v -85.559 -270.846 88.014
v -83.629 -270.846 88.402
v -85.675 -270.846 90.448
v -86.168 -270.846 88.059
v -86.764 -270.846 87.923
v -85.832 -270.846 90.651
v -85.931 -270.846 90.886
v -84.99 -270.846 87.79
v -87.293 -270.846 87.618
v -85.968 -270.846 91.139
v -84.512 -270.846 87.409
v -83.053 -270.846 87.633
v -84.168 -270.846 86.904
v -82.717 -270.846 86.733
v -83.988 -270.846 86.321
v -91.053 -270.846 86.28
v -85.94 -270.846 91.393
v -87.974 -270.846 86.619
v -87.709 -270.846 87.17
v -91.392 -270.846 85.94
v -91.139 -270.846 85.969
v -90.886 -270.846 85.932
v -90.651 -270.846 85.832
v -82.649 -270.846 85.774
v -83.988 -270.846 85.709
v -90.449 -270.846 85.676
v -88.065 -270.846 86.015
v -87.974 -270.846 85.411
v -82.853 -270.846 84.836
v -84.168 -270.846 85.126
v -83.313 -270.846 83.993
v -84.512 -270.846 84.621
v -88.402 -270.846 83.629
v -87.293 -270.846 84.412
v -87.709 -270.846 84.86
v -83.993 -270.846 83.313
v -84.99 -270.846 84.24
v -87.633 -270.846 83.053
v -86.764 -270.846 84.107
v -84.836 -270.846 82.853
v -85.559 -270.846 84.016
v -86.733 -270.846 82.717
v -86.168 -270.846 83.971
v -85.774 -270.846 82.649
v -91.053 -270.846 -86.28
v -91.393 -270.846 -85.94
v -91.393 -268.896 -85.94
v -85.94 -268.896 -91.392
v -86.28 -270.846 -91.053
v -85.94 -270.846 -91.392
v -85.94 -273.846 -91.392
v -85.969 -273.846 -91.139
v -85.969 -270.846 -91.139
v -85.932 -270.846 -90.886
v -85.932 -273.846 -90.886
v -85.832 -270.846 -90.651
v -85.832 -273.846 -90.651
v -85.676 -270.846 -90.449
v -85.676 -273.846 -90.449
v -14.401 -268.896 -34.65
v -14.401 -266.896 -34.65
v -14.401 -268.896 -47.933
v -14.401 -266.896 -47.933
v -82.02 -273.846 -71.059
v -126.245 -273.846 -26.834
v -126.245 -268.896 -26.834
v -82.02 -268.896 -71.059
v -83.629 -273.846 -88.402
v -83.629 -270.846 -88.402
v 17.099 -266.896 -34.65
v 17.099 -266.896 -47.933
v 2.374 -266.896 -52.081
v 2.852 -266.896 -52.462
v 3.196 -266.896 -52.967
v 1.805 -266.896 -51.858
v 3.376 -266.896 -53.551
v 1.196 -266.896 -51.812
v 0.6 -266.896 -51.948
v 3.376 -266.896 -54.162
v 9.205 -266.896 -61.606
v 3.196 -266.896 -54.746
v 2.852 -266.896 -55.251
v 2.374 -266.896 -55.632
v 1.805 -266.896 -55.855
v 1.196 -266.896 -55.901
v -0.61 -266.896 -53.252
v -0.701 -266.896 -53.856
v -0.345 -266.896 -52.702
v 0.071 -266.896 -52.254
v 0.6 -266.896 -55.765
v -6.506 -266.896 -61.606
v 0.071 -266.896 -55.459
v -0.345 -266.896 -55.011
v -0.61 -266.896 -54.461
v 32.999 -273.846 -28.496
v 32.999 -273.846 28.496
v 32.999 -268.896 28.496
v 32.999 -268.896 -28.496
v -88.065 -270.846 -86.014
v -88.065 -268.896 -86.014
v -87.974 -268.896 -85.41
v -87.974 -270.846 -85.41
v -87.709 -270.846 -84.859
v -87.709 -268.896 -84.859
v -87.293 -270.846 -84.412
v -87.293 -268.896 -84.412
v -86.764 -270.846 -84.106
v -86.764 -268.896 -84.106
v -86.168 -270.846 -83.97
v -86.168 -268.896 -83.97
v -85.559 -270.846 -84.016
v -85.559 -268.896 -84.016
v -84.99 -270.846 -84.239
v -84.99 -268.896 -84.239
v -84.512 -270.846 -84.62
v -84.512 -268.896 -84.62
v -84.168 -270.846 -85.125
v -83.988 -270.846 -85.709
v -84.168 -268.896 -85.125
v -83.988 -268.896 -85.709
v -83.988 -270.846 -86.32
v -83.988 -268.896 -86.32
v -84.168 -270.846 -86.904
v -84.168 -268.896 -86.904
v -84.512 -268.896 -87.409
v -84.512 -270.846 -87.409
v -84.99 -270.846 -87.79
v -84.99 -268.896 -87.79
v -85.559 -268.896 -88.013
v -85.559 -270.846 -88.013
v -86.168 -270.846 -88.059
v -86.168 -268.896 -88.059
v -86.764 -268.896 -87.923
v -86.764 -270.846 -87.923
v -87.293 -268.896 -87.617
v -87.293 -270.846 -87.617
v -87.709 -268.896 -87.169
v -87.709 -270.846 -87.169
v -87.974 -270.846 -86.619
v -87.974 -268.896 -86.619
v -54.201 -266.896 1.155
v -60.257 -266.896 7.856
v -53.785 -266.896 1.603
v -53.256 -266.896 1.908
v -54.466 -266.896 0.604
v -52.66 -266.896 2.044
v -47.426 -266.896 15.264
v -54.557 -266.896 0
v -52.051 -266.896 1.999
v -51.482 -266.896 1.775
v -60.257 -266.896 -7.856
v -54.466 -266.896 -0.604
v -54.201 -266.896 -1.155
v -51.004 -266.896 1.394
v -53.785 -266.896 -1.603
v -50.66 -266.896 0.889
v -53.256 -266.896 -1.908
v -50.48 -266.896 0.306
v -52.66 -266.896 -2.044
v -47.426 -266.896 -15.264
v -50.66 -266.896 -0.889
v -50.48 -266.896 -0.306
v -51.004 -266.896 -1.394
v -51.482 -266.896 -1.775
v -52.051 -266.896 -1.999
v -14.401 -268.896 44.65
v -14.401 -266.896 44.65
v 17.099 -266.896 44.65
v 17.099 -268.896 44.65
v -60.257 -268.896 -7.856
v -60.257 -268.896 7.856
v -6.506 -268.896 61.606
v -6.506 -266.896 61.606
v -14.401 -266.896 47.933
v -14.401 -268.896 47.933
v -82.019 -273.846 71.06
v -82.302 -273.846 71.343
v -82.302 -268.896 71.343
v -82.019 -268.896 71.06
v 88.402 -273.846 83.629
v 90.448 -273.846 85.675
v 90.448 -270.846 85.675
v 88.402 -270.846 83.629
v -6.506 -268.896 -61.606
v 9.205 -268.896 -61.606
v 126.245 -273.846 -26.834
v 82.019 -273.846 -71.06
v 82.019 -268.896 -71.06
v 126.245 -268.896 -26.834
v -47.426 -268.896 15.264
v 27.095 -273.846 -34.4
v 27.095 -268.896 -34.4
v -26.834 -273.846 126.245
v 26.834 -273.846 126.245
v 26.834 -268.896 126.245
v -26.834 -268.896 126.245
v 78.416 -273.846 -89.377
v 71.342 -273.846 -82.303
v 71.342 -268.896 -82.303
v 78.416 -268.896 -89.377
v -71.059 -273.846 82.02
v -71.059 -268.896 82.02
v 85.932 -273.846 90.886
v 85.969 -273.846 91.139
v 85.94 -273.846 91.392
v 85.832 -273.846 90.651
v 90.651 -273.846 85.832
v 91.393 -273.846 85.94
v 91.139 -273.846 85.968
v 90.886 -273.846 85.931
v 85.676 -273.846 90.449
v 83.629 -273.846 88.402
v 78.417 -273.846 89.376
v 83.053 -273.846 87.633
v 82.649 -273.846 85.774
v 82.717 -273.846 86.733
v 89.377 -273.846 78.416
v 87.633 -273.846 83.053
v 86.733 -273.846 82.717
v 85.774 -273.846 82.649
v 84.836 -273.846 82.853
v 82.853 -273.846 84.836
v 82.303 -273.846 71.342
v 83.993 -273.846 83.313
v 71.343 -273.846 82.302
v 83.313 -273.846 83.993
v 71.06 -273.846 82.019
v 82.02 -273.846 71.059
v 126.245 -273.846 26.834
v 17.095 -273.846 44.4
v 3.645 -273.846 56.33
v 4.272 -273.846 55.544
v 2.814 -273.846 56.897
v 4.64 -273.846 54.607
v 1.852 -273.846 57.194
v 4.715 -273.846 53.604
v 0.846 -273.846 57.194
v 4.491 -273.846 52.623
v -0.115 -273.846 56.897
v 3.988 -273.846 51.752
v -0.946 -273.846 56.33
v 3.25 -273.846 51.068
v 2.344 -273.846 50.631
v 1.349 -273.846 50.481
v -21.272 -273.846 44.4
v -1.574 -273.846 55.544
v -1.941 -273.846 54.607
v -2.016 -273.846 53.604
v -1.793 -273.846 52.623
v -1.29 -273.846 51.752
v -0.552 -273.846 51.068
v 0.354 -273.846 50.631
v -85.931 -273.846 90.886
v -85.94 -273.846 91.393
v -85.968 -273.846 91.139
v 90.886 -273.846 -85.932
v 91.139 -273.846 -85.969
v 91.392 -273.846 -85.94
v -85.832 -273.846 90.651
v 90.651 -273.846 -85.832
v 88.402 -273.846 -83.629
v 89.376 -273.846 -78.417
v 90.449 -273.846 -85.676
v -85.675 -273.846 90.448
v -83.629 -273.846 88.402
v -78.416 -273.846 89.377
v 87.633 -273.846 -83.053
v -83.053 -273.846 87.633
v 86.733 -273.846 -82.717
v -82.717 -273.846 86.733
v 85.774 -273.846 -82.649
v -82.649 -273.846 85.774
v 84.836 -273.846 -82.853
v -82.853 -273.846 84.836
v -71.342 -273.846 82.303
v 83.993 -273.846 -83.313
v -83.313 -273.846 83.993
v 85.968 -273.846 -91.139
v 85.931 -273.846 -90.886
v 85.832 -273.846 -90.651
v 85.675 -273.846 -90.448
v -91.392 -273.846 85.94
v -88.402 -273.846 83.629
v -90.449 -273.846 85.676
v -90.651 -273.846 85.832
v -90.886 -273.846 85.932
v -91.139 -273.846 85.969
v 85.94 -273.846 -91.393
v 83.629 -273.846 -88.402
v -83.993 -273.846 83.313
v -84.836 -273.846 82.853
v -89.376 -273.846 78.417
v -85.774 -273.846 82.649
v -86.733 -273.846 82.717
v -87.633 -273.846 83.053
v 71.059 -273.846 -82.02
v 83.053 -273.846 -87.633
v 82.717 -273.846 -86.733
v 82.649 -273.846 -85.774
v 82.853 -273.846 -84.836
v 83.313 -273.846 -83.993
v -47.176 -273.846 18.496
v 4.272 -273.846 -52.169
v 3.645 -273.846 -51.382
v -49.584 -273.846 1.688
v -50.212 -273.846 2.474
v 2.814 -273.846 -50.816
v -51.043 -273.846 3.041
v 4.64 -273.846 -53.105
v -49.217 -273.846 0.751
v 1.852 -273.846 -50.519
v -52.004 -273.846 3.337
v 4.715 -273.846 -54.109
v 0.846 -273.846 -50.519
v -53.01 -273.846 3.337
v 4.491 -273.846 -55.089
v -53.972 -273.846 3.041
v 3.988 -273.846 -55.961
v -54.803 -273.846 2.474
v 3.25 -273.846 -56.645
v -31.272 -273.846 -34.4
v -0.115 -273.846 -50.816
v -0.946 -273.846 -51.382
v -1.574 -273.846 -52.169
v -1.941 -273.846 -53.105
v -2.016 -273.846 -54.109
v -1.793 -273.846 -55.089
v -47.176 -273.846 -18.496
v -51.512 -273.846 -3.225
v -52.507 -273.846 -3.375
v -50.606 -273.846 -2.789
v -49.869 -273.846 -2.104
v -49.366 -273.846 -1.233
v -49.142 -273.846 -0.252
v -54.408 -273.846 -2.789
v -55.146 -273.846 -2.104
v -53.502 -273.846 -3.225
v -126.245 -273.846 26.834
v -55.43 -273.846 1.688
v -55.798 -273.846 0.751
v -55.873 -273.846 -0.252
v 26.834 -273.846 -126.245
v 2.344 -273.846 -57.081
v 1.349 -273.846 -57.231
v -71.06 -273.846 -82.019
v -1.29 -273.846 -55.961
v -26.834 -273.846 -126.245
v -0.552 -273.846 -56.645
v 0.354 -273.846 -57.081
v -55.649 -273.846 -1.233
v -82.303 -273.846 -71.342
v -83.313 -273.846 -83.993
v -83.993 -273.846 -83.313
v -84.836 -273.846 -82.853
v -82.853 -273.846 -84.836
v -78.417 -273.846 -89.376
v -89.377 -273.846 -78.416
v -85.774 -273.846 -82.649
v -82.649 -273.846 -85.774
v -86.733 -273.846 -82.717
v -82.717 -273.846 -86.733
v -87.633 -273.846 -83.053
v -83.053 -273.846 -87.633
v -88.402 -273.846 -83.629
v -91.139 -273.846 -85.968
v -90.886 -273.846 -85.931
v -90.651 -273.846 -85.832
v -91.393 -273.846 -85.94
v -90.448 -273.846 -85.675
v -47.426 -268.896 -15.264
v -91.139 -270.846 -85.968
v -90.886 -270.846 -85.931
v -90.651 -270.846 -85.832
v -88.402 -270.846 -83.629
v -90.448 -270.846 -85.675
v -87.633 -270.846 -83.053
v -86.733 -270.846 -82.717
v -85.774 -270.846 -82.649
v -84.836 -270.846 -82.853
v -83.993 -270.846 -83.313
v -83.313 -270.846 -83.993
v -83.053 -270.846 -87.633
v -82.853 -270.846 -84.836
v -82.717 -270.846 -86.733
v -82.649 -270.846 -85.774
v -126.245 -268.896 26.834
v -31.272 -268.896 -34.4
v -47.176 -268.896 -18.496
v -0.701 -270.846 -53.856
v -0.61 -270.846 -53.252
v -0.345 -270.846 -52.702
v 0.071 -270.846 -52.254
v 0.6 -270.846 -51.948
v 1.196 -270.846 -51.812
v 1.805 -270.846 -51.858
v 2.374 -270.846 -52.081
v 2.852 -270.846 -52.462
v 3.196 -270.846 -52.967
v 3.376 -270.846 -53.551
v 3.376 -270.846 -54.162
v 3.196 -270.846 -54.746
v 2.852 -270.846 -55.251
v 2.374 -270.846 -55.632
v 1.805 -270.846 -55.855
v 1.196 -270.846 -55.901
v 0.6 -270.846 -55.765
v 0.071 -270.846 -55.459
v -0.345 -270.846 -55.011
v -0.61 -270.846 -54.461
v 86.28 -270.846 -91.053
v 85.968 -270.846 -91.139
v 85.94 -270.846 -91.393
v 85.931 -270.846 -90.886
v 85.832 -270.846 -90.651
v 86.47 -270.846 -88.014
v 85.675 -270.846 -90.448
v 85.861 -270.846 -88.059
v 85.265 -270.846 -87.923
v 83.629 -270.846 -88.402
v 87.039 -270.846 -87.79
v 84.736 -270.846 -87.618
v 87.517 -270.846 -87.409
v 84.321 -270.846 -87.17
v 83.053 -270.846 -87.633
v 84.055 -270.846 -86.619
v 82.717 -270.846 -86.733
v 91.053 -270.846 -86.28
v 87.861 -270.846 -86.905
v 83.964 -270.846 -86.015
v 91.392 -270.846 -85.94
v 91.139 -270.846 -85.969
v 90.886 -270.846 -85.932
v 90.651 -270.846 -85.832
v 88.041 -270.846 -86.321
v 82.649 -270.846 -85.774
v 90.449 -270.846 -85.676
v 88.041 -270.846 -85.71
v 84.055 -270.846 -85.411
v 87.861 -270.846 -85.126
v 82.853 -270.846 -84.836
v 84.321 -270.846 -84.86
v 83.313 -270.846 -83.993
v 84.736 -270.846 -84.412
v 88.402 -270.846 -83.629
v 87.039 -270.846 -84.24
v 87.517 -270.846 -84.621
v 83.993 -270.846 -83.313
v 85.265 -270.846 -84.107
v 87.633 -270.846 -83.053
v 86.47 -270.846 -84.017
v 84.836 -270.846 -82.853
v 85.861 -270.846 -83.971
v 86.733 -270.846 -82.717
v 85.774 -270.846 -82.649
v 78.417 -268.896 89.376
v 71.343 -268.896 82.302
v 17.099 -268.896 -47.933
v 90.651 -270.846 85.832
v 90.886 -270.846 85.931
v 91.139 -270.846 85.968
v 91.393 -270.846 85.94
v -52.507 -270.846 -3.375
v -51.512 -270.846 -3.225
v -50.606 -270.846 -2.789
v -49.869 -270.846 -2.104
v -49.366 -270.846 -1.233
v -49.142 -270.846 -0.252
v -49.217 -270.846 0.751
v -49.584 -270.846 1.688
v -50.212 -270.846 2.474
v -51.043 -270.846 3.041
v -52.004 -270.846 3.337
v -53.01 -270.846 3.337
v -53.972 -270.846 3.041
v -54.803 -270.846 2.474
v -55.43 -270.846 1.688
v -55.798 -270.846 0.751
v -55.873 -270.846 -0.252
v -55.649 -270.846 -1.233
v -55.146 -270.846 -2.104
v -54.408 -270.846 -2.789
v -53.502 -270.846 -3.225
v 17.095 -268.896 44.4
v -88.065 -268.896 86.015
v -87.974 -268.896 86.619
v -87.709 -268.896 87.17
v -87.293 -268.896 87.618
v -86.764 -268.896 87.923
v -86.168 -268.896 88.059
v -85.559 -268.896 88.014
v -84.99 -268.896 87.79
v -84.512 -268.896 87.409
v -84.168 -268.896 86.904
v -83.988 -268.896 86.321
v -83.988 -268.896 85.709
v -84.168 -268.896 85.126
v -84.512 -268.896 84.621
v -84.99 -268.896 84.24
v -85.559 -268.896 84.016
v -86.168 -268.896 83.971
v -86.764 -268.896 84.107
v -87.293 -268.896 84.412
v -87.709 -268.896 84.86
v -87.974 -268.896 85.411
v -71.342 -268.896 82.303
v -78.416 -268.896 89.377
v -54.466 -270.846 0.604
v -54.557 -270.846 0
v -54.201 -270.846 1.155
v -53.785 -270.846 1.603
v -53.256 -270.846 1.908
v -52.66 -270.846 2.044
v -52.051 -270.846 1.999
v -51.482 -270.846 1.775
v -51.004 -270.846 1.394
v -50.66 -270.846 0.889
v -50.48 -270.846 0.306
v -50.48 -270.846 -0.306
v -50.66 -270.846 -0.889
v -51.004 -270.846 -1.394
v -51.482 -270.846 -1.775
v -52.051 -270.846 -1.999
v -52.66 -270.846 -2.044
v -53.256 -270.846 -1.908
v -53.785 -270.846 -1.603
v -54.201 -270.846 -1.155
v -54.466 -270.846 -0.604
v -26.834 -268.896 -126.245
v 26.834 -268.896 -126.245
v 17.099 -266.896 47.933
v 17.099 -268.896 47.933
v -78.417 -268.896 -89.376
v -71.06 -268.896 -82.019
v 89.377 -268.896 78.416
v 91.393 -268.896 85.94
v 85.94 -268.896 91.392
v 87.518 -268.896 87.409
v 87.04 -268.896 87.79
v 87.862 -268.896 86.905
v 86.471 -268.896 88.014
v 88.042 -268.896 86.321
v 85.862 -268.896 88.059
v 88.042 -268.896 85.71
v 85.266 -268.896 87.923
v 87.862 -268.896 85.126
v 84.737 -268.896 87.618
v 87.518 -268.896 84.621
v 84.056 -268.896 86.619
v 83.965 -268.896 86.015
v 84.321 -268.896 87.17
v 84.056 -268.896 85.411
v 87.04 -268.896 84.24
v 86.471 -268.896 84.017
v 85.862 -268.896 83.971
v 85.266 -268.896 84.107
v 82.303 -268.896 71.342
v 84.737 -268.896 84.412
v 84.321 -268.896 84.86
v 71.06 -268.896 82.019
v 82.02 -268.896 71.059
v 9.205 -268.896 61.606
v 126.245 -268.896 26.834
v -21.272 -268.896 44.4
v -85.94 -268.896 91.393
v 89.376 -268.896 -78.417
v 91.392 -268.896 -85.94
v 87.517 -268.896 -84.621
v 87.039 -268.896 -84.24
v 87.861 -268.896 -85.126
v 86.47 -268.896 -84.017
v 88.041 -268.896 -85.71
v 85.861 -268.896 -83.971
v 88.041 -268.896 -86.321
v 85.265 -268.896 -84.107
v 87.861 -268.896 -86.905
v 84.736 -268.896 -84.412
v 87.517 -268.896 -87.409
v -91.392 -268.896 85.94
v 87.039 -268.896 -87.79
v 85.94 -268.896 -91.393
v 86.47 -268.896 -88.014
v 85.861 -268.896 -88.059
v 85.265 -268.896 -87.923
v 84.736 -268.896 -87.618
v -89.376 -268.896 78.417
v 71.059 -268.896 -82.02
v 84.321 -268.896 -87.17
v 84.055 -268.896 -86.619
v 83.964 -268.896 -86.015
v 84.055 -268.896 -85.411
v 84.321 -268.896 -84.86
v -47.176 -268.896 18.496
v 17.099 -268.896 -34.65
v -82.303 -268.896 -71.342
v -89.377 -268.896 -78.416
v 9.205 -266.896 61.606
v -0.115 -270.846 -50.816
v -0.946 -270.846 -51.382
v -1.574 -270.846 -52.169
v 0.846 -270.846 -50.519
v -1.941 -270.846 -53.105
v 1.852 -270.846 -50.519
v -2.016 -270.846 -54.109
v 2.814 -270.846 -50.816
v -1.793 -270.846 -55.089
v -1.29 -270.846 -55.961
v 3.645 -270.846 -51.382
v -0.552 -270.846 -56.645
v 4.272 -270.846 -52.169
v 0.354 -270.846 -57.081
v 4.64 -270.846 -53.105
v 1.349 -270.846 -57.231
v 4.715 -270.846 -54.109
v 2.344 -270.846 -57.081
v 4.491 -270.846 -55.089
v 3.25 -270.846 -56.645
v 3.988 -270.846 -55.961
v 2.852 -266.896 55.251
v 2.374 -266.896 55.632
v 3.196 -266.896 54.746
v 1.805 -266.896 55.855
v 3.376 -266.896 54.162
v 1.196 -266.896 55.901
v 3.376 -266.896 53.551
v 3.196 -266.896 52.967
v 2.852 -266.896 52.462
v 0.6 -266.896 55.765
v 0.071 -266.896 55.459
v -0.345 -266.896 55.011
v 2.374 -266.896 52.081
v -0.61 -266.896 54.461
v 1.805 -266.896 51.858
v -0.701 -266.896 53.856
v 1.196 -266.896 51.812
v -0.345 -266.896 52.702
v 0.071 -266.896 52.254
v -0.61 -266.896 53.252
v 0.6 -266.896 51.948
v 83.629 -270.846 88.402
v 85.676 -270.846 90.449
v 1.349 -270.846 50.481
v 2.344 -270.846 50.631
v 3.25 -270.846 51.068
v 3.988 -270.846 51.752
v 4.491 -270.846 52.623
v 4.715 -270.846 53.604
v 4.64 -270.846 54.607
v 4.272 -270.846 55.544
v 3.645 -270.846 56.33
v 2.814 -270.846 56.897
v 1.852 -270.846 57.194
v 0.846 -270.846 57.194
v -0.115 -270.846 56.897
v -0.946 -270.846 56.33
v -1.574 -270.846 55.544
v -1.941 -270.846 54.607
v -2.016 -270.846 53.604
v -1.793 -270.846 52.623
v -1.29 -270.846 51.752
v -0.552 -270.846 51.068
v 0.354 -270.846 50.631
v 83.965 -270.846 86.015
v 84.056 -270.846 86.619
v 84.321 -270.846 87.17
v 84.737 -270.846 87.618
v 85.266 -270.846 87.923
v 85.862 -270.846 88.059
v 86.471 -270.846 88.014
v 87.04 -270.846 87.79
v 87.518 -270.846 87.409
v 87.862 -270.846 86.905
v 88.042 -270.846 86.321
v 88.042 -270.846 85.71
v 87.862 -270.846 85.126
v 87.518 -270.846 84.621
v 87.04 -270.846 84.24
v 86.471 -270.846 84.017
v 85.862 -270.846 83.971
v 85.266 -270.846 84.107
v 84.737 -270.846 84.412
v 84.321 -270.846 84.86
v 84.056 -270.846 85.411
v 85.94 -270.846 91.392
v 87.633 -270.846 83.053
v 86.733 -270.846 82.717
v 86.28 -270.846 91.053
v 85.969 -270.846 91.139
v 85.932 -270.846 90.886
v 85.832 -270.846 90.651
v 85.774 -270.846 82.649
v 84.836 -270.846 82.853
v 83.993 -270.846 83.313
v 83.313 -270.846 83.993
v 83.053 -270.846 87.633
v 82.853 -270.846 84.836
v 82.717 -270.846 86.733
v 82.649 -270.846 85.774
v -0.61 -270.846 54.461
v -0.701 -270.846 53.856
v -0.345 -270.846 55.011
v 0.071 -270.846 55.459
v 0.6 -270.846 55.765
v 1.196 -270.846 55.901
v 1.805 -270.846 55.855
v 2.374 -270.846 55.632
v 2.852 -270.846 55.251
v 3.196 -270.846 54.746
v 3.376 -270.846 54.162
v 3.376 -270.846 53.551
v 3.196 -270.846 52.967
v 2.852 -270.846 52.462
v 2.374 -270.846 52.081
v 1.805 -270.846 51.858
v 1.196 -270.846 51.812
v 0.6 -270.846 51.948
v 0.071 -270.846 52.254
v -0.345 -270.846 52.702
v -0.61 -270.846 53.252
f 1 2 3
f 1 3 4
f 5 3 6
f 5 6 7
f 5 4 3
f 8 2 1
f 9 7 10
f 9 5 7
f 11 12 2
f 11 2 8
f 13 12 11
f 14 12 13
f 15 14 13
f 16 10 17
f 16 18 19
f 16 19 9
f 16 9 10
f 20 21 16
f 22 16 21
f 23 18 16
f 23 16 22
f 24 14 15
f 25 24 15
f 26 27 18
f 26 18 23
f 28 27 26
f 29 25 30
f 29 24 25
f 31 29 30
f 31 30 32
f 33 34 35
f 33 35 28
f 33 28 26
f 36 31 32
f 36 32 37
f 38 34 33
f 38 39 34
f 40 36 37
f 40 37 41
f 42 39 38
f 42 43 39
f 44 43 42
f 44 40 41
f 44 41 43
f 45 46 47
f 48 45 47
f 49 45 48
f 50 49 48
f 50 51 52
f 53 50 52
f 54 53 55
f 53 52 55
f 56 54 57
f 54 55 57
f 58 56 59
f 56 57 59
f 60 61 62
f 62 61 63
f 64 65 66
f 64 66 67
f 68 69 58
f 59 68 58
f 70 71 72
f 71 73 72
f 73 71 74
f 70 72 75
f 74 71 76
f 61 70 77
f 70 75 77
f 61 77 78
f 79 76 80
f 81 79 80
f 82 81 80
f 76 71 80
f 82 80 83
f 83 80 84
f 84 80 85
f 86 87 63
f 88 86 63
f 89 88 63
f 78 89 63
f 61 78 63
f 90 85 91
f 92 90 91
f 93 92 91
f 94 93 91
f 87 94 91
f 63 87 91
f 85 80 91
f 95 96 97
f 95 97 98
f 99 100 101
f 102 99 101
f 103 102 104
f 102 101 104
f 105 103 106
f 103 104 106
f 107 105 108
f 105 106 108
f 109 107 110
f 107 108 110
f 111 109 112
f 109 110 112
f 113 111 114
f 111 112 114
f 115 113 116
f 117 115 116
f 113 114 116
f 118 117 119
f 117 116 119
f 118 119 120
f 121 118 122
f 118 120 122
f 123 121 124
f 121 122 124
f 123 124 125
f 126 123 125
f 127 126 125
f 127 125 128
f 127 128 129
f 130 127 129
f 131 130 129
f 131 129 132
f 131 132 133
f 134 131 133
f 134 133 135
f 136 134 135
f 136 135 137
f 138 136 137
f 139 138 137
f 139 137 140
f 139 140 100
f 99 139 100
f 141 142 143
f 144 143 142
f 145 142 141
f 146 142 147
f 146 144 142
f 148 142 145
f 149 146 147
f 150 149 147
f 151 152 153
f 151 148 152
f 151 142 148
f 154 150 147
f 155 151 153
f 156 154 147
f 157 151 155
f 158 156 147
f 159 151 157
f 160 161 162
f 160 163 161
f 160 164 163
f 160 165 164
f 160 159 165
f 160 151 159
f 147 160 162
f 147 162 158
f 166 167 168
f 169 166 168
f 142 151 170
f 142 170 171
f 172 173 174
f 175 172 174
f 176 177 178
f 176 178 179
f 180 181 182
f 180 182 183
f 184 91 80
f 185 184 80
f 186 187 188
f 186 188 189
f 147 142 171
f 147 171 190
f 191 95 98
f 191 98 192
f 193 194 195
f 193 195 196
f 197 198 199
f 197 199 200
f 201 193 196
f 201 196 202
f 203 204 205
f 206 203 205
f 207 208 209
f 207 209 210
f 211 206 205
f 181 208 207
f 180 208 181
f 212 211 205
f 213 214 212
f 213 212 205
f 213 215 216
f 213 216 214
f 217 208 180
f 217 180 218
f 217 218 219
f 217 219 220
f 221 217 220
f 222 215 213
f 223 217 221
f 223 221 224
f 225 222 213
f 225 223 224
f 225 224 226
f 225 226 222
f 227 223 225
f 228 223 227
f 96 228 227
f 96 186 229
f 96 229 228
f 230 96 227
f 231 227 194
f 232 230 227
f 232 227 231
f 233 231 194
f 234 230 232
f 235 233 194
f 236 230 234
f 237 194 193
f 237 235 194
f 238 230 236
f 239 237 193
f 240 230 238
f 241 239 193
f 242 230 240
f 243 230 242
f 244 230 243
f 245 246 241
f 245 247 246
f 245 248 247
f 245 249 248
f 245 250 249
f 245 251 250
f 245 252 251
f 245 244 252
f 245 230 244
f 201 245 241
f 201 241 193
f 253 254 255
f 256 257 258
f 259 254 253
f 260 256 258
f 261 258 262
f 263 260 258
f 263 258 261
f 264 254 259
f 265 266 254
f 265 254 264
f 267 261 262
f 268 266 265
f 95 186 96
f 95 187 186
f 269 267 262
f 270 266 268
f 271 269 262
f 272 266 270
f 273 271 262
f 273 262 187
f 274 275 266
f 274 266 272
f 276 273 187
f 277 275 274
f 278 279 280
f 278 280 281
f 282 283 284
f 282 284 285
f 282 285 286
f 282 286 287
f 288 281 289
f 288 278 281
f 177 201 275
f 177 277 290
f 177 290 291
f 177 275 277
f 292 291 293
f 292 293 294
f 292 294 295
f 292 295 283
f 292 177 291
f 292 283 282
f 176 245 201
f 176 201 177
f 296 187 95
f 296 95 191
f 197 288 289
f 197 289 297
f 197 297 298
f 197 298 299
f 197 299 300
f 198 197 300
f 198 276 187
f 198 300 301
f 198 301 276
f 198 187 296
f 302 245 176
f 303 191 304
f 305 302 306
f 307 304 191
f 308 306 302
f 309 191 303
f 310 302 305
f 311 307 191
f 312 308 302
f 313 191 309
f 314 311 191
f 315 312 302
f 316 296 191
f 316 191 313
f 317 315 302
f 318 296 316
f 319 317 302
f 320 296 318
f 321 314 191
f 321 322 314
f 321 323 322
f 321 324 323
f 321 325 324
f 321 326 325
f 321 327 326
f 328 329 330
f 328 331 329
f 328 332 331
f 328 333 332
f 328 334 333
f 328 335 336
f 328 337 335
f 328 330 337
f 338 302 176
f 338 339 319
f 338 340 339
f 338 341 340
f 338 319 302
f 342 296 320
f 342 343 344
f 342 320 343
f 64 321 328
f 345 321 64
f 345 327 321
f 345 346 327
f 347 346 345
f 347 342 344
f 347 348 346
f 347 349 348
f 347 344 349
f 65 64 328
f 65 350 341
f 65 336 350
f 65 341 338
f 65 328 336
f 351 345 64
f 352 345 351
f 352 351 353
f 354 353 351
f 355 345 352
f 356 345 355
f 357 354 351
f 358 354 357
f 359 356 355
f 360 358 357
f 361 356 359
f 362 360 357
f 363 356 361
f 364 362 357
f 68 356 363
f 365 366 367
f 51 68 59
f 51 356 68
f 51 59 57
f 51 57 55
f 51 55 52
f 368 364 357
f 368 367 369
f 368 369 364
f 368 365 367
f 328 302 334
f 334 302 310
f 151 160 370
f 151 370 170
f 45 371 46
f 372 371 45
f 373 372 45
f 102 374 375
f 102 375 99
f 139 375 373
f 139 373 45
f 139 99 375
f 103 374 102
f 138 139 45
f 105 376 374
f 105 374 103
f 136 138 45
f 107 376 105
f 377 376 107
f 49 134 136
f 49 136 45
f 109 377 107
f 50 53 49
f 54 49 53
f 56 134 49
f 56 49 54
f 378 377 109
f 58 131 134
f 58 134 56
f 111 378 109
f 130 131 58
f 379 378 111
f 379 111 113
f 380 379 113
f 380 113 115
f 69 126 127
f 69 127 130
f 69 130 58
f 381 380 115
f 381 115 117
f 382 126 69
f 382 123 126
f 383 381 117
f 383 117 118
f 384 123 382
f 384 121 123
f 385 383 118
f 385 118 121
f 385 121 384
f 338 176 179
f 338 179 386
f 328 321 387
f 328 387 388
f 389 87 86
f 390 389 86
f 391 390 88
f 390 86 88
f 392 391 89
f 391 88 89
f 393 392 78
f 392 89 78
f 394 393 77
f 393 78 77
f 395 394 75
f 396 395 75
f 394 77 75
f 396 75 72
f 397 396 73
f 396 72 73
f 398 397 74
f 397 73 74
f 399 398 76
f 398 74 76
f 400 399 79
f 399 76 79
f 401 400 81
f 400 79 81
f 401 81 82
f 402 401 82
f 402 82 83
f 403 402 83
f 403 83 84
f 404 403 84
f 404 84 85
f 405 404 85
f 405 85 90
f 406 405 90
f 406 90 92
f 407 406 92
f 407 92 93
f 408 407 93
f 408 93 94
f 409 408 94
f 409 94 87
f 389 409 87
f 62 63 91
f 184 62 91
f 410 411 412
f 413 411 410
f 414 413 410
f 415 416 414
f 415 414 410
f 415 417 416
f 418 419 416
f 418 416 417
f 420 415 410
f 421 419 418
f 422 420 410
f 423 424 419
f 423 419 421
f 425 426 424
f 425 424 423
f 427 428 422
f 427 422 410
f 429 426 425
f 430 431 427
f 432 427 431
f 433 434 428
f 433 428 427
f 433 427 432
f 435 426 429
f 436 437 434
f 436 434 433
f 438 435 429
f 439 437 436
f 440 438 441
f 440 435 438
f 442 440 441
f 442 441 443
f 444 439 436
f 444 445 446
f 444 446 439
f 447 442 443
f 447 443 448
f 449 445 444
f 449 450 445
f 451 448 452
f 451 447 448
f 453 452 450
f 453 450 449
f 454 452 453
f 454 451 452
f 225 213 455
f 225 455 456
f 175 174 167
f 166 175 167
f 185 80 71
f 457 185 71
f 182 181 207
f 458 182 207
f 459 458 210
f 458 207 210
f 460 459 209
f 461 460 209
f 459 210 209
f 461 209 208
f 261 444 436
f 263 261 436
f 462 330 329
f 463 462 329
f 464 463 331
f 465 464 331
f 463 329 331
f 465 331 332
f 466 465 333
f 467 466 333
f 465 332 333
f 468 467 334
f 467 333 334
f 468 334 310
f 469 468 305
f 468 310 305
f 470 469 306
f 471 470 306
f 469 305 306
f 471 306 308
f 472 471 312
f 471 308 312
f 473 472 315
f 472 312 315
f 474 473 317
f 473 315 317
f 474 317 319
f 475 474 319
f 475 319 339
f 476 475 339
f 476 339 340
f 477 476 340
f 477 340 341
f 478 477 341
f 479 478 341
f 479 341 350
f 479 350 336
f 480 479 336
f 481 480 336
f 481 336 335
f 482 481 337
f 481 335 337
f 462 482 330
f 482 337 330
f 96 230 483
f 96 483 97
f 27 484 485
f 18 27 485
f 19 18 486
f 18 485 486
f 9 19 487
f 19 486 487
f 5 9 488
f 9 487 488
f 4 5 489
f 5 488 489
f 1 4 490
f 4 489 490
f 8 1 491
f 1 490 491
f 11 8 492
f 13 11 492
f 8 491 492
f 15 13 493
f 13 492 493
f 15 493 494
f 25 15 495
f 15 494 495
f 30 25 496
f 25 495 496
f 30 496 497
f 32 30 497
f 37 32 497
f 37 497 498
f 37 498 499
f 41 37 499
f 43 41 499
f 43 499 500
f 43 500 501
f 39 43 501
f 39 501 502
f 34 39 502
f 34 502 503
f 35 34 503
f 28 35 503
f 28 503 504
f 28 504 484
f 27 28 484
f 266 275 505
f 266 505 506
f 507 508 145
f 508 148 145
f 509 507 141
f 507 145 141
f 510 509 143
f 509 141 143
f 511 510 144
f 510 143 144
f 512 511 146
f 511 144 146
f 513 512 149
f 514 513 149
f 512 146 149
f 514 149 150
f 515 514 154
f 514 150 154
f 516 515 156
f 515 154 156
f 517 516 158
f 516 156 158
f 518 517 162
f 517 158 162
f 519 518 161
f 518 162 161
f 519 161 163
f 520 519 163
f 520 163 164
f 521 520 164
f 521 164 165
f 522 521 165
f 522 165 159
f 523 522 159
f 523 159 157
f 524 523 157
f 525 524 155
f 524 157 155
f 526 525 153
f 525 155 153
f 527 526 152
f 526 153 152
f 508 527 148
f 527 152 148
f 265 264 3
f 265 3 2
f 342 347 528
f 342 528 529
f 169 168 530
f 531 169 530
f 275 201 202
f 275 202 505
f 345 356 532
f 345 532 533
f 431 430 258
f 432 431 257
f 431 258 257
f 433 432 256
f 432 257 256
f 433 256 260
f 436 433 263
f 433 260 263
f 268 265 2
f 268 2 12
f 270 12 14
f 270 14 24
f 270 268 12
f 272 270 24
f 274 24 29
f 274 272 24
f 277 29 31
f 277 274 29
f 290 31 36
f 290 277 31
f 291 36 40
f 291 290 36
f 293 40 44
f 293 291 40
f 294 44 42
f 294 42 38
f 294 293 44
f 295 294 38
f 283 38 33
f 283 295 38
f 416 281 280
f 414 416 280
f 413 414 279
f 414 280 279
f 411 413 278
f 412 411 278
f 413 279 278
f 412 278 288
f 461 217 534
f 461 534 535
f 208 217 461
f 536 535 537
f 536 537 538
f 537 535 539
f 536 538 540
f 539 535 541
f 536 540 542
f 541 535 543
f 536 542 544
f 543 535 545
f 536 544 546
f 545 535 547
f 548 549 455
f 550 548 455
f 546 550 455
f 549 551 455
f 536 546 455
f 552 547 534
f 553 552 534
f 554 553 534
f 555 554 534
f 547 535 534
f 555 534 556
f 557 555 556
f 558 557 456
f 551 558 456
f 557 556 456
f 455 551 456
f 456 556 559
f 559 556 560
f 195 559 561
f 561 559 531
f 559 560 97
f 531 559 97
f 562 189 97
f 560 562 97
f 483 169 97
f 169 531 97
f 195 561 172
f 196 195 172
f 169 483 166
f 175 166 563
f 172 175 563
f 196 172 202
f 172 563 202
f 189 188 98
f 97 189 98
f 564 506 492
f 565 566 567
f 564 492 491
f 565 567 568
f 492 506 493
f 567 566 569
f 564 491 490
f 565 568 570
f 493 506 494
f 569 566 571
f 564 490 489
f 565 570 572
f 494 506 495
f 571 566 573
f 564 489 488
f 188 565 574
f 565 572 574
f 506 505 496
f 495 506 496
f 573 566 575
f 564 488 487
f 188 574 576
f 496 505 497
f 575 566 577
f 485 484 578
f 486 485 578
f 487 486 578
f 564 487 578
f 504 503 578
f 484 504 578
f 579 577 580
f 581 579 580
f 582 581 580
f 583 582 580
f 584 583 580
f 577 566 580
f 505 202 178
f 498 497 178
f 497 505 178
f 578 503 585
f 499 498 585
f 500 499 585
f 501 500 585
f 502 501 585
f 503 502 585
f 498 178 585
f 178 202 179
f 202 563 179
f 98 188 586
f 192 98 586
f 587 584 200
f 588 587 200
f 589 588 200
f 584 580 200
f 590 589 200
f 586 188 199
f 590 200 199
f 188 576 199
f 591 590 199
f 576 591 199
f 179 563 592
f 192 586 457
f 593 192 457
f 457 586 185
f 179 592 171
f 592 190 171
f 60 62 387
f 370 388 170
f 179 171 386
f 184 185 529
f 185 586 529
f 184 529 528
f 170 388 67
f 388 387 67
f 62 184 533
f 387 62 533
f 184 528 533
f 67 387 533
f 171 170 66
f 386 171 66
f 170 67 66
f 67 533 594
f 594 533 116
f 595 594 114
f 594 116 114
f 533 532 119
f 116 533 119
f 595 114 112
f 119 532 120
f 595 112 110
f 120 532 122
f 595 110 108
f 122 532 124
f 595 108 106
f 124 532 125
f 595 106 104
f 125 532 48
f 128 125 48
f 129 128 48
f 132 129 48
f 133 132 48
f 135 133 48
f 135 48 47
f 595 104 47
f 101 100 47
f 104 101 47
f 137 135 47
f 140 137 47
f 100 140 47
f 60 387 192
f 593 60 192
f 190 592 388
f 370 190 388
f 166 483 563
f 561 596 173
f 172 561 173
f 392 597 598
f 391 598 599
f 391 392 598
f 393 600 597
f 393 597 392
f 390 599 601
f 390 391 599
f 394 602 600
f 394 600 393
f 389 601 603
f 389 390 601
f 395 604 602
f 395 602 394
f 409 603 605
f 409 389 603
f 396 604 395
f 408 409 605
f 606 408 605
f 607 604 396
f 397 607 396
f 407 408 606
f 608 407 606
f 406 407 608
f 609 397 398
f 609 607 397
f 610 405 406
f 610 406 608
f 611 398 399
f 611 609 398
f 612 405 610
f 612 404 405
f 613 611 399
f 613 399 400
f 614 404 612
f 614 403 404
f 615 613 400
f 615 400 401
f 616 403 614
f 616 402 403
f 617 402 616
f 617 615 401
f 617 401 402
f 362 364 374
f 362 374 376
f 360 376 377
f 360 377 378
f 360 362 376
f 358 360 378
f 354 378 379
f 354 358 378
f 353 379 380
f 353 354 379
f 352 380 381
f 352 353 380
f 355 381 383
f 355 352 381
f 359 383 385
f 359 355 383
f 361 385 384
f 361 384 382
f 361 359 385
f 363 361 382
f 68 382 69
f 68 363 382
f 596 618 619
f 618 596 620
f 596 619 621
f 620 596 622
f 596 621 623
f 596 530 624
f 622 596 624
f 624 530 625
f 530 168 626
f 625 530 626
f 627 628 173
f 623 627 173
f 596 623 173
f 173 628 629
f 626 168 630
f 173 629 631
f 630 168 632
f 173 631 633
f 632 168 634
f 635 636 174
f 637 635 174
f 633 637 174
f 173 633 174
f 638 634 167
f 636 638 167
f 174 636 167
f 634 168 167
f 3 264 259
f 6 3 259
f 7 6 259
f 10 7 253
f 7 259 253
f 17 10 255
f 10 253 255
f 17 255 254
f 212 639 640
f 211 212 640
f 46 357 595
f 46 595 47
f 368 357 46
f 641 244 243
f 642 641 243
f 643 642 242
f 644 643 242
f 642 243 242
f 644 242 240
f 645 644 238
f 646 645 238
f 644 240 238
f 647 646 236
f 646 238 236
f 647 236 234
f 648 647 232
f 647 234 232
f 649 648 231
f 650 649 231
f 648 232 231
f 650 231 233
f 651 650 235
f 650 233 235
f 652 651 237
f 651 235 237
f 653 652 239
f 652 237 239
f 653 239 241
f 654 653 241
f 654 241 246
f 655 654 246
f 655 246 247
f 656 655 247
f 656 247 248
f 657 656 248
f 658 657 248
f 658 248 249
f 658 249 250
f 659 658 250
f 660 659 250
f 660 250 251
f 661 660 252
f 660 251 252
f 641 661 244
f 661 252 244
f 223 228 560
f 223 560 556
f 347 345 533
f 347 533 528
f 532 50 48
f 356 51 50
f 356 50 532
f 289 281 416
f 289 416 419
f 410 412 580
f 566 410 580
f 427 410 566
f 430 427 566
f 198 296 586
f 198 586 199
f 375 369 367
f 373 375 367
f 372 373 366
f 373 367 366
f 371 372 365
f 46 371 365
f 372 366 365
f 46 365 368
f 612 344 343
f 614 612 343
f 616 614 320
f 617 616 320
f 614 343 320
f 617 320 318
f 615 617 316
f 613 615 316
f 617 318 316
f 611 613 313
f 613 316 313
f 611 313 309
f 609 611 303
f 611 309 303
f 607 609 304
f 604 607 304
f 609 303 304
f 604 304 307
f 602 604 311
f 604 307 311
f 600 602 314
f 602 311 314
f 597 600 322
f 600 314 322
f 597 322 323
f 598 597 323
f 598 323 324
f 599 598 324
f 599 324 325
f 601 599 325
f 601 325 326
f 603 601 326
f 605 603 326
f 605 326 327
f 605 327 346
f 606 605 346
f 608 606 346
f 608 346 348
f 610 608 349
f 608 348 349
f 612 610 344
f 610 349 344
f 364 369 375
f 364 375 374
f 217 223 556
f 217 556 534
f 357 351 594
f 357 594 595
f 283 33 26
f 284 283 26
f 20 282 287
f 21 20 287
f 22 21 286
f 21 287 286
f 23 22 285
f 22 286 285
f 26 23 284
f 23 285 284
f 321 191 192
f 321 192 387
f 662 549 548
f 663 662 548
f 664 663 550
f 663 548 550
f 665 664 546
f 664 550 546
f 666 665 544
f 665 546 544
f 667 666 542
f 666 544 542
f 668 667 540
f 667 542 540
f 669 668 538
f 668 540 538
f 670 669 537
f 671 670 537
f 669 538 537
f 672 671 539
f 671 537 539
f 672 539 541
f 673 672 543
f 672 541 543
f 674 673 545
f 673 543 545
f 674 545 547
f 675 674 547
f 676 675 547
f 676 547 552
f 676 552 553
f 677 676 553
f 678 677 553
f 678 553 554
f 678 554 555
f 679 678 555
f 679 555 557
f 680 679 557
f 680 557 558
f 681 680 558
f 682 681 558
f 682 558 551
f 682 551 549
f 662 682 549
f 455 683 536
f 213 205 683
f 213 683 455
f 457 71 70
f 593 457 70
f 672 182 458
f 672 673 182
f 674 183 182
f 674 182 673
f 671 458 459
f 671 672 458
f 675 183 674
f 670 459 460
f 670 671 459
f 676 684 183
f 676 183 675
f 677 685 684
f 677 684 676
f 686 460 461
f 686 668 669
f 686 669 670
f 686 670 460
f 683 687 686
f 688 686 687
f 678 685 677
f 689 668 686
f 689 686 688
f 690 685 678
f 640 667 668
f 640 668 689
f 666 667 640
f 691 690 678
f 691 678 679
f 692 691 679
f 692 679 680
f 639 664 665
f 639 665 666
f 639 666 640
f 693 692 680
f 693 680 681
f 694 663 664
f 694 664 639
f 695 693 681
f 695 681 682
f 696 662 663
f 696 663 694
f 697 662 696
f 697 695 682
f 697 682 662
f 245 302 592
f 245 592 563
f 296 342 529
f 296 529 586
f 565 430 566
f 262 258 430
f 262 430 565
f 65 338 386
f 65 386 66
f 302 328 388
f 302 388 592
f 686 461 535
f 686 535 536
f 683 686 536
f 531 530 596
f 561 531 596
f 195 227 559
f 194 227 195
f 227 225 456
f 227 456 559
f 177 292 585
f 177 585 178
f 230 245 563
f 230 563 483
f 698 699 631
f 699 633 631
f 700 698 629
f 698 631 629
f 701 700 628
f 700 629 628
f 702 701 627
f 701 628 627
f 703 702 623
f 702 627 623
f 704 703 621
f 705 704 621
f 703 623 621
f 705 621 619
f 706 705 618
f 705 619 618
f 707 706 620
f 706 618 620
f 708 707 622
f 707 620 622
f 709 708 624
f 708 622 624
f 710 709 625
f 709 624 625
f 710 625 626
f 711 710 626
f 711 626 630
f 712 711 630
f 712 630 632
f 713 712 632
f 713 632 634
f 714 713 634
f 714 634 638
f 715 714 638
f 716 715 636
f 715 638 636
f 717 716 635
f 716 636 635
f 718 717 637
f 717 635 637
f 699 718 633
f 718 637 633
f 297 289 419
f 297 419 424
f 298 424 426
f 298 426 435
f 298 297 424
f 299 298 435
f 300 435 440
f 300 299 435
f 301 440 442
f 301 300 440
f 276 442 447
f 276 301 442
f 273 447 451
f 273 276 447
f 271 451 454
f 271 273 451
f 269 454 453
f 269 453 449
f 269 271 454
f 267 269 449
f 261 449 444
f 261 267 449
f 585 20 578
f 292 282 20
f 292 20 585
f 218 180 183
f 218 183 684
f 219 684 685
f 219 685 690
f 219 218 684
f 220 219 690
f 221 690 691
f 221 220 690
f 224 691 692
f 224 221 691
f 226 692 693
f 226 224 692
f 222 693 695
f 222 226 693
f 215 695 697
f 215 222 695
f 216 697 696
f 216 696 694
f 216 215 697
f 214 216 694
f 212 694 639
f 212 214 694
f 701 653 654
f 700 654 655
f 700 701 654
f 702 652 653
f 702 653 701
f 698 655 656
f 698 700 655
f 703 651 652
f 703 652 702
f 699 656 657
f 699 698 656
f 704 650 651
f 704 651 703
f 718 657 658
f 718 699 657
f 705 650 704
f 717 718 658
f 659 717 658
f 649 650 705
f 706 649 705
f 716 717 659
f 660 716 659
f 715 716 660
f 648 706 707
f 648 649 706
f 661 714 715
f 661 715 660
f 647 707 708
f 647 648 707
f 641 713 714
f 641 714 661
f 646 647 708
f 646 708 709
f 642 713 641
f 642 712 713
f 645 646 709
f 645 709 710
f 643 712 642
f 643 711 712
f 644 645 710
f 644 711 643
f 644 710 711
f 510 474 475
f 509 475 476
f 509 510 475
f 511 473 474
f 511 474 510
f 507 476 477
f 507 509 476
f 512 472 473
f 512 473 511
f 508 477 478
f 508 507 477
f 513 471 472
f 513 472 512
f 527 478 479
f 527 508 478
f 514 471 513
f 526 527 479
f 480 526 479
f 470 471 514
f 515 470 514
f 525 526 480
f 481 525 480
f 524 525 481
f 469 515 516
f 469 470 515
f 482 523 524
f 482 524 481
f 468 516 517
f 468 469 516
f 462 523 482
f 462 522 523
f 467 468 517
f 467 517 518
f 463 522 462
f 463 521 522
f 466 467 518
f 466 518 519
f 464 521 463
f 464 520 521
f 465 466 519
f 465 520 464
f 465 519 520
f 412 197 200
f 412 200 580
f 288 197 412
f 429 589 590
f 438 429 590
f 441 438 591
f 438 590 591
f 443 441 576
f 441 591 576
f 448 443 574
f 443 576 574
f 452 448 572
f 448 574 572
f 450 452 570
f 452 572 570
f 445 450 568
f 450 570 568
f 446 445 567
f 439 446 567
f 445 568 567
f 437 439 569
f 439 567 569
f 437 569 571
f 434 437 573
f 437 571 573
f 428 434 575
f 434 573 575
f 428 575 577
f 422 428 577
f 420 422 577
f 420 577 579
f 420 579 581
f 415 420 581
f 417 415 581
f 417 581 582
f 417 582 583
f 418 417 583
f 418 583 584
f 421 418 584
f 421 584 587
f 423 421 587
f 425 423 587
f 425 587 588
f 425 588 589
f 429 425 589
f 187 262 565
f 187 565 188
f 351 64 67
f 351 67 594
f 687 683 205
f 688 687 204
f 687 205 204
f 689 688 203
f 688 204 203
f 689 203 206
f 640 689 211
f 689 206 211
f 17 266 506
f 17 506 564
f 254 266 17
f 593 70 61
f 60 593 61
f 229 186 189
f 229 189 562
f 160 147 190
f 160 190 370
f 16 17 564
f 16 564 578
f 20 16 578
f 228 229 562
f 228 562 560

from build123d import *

# Parameters (mm, degrees)
BOSS_EXTRUDE1_DEPTH = 4.95
SKETCH2_R           = 2.05
CUT_EXTRUDE1_DEPTH  = 179.606105426
BOSS_EXTRUDE2_START = 2
SKETCH4_R           = 2.05
BOSS_EXTRUDE2_DEPTH = 2
SKETCH5_R           = 3.375
CUT_EXTRUDE2_DEPTH  = 3
FILLET1_R           = 1


with BuildPart() as part:
    # Sketch1 → Boss-Extrude1 (new body)
    with BuildSketch(Plane(origin=(0, -273.846152423, 0), x_dir=(-1, 0, 0), z_dir=(0, -1, 0))):
        Polygon((82.019978644, 71.058996872), (82.302821357, 71.341839584), (89.377289978, 78.416308206), (91.393147439, 85.939590671), (85.940417335, 91.392320775), (78.41713487, 89.376463314), (71.342666248, 82.301994692), (71.059823536, 82.01915198), (26.834314575, 126.244660941), (-26.834314575, 126.244660941), (-71.058996872, 82.019978644), (-71.341839584, 82.302821357), (-78.416308206, 89.377289978), (-85.939590671, 91.393147439), (-91.392320775, 85.940417335), (-89.376463314, 78.41713487), (-82.301994692, 71.342666248), (-82.01915198, 71.059823536), (-126.244660941, 26.834314575), (-126.244660941, -26.834315555), (-82.020164054, -71.059182282), (-82.302821357, -71.341839584), (-89.377289978, -78.416308206), (-91.393147439, -85.939590671), (-85.940417335, -91.392320775), (-78.41713487, -89.376463314), (-71.342666248, -82.301994692), (-71.060054774, -82.019383219), (-26.834316916, -126.245490927), (26.834310282, -126.245490927), (71.059226271, -82.020208043), (71.341839584, -82.302821357), (78.416308206, -89.377289978), (85.939590671, -91.393147439), (91.392320775, -85.940417335), (89.376463314, -78.41713487), (82.301994692, -71.342666248), (82.019335916, -71.060007471), (126.244660941, -26.834315547), (126.244660941, 26.834314575), align=None)
        Polygon((-32.999177325, -28.496194078), (-32.999177325, -5.25), (-32.999177325, 5.25), (-32.999177325, 28.496194078), (-27.095371402, 34.4), (31.271815024, 34.4), (47.175620946, 18.496194078), (47.175620946, -18.496194078), (21.271815024, -44.4), (-17.095371403, -44.4), align=None, mode=Mode.SUBTRACT)
    extrude(amount=-BOSS_EXTRUDE1_DEPTH)

    # Sketch2 → Cut-Extrude1 (cut, through all)
    with BuildSketch(Plane(origin=(0, -268.896152423, 0), x_dir=(1, 0, 0), z_dir=(0, 1, 0))):
        with Locations(Location((-86.015131958, 86.014305294, 0), (0, 0, 180))):
            Circle(SKETCH2_R)
        with Locations(Location((86.014305294, 86.015131958, 0), (0, 0, 180))):
            Circle(SKETCH2_R)
        with Locations(Location((86.015135278, -86.01513528, 0), (0, 0, 180))):
            Circle(SKETCH2_R)
        with Locations(Location((-86.015036236, -86.015036236, 0), (0, 0, 180))):
            Circle(SKETCH2_R)
        with Locations(Location((1.349177325, 53.85640646, 0), (0, 0, 180))):
            Circle(SKETCH2_R)
        with Locations(Location((-52.507229136, 0, 0), (0, 0, 180))):
            Circle(SKETCH2_R)
        with Locations(Location((1.349177325, -53.856406461, 0), (0, 0, 180))):
            Circle(SKETCH2_R)
    extrude(amount=-CUT_EXTRUDE1_DEPTH, mode=Mode.SUBTRACT)

    # Sketch4 → Boss-Extrude2 (add)
    # profile 1 of 3: a face of its own
    with BuildSketch(Plane(origin=(0, -268.896152423, 0), x_dir=(1, 0, 0), z_dir=(0, 1, 0)).offset(BOSS_EXTRUDE2_START)):
        Polygon((17.099177325, 47.933012702), (17.099177325, 34.65), (-14.400822675, 34.65), (-14.400822675, 47.933012702), (-6.506485108, 61.60640646), (9.204839757, 61.60640646), align=None)
        with Locations(Location((1.349177325, 53.85640646, 0), (0, 0, 180))):
            Circle(SKETCH4_R, mode=Mode.SUBTRACT)
    # profile 2 of 3: a face of its own
    with BuildSketch(Plane(origin=(0, -268.896152423, 0), x_dir=(1, 0, 0), z_dir=(0, 1, 0)).offset(BOSS_EXTRUDE2_START)):
        Polygon((-60.257229136, 7.855662432), (-60.257229136, -7.855662433), (-47.425620946, -15.263994875), (-47.425620946, 15.263994875), align=None)
        with Locations(Location((-52.507229136, 0, 0), (0, 0, 180))):
            Circle(SKETCH4_R, mode=Mode.SUBTRACT)
    # profile 3 of 3: a face of its own
    with BuildSketch(Plane(origin=(0, -268.896152423, 0), x_dir=(1, 0, 0), z_dir=(0, 1, 0)).offset(BOSS_EXTRUDE2_START)):
        Polygon((-14.400822675, -44.65), (17.099177325, -44.65), (17.099177325, -47.933012702), (9.204839758, -61.606406461), (-6.506485108, -61.606406461), (-14.400822675, -47.933012702), align=None)
        with Locations(Location((1.349177325, -53.856406461, 0), (0, 0, 180))):
            Circle(SKETCH4_R, mode=Mode.SUBTRACT)
    extrude(amount=-BOSS_EXTRUDE2_DEPTH)

    # Sketch5 → Cut-Extrude2 (cut)
    with BuildSketch(Plane.XZ.offset(273.846152423)):
        with Locations(Location((1.349177325, 53.856406461, 0), (0, 0, 270))):
            Circle(SKETCH5_R)
        with Locations(Location((-52.507229136, 0, 0), (0, 0, 270))):
            Circle(SKETCH5_R)
        with Locations(Location((1.349177325, -53.85640646, 0), (0, 0, 270))):
            Circle(SKETCH5_R)
        with BuildLine():
            Line((83.628649892, 88.401620667), (86.279883668, 91.052854443))
            Line((86.279883668, 91.052854443), (91.052854441, 86.27988367))
            Line((91.052854441, 86.27988367), (88.401620665, 83.628649894))
            ThreePointArc((88.401620665, 83.628649894), (83.628649892, 83.628649894), (83.628649892, 88.401620667))
        make_face()
        with BuildLine():
            Line((88.401620667, -83.628649892), (91.052854443, -86.279883668))
            Line((91.052854443, -86.279883668), (86.27988367, -91.052854441))
            Line((86.27988367, -91.052854441), (83.628649894, -88.401620665))
            ThreePointArc((83.628649894, -88.401620665), (83.628649894, -83.628649892), (88.401620667, -83.628649892))
        make_face()
        with BuildLine():
            Line((-83.628649892, -88.401620667), (-86.279883668, -91.052854443))
            Line((-86.279883668, -91.052854443), (-91.052854441, -86.27988367))
            Line((-91.052854441, -86.27988367), (-88.401620665, -83.628649894))
            ThreePointArc((-88.401620665, -83.628649894), (-83.628649892, -83.628649894), (-83.628649892, -88.401620667))
        make_face()
        with BuildLine():
            Line((-88.401620667, 83.628649892), (-91.052854443, 86.279883668))
            Line((-91.052854443, 86.279883668), (-86.27988367, 91.052854441))
            Line((-86.27988367, 91.052854441), (-83.628649894, 88.401620665))
            ThreePointArc((-83.628649894, 88.401620665), (-83.628649894, 83.628649892), (-88.401620667, 83.628649892))
        make_face()
    extrude(amount=-CUT_EXTRUDE2_DEPTH, mode=Mode.SUBTRACT)

    # Fillet1
    # the kernel refuses this fillet: 1 mm, written as the material it takes off along each edge
    with BuildSketch(Plane(origin=(86.27988367, -275.983462791, -91.052854441), x_dir=(-0.7071067811867837, 0, -0.7071067811863112), z_dir=(0, 1, 0)), Plane(origin=(-91.052854441, -275.983462791, -86.27988367), x_dir=(-0.7071067811863703, 0, 0.7071067811867247), z_dir=(0, 1, 0)), Plane(origin=(-86.27988367, -275.983462791, 91.052854441), x_dir=(0.7071067811867394, 0, 0.7071067811863555), z_dir=(0, 1, 0)), Plane(origin=(91.052854441, -275.983462791, 86.27988367), x_dir=(0.7071067811863704, 0, -0.7071067811867248), z_dir=(0, 1, 0))) as fillet1_piece_1:
        with BuildLine():
            CenterArc((1, 0.854924147), FILLET1_R, 180, 58.751355935)
            Line((0, 0.854924147), (-0.02, 0.854924147))
            Line((-0.02, 0.854924147), (-0.02, 0))
            Line((-0.02, 0), (0, -0.02))
            ThreePointArc((0, -0.02), (0.240623487, -0.02), (0.470871913, -0.017098483))
            Line((0.470871913, -0.017098483), (0.481246974, 0))
        make_face()
    extrude(amount=5.137310369, mode=Mode.SUBTRACT)
    with BuildSketch(Plane(origin=(91.052854443, -275.981686608, -86.279883668), x_dir=(0.7071067811863996, 0, 0.7071067811866956), z_dir=(0, 1, 0)), Plane(origin=(-86.279883668, -275.981686608, -91.052854443), x_dir=(0.7071067811866807, 0, -0.7071067811864143), z_dir=(0, 1, 0)), Plane(origin=(-91.052854443, -275.981686608, 86.279883668), x_dir=(-0.7071067811863847, 0, -0.7071067811867103), z_dir=(0, 1, 0)), Plane(origin=(86.279883668, -275.981686608, 91.052854443), x_dir=(-0.7071067811866955, 0, 0.7071067811863995), z_dir=(0, 1, 0))) as fillet1_piece_2:
        with BuildLine():
            CenterArc((1, -0.854213674), FILLET1_R, 121.327026837, 58.672973163)
            Line((0, -0.854213674), (-0.02, -0.854213674))
            Line((-0.02, -0.854213674), (-0.02, 0))
            Line((-0.02, 0), (0, 0.02))
            ThreePointArc((0, 0.02), (0.240038946, 0.02), (0.469679449, 0.017084273))
            Line((0.469679449, 0.017084273), (0.480077891, 0))
        make_face()
    extrude(amount=5.135534185, mode=Mode.SUBTRACT)


solid = part.part
